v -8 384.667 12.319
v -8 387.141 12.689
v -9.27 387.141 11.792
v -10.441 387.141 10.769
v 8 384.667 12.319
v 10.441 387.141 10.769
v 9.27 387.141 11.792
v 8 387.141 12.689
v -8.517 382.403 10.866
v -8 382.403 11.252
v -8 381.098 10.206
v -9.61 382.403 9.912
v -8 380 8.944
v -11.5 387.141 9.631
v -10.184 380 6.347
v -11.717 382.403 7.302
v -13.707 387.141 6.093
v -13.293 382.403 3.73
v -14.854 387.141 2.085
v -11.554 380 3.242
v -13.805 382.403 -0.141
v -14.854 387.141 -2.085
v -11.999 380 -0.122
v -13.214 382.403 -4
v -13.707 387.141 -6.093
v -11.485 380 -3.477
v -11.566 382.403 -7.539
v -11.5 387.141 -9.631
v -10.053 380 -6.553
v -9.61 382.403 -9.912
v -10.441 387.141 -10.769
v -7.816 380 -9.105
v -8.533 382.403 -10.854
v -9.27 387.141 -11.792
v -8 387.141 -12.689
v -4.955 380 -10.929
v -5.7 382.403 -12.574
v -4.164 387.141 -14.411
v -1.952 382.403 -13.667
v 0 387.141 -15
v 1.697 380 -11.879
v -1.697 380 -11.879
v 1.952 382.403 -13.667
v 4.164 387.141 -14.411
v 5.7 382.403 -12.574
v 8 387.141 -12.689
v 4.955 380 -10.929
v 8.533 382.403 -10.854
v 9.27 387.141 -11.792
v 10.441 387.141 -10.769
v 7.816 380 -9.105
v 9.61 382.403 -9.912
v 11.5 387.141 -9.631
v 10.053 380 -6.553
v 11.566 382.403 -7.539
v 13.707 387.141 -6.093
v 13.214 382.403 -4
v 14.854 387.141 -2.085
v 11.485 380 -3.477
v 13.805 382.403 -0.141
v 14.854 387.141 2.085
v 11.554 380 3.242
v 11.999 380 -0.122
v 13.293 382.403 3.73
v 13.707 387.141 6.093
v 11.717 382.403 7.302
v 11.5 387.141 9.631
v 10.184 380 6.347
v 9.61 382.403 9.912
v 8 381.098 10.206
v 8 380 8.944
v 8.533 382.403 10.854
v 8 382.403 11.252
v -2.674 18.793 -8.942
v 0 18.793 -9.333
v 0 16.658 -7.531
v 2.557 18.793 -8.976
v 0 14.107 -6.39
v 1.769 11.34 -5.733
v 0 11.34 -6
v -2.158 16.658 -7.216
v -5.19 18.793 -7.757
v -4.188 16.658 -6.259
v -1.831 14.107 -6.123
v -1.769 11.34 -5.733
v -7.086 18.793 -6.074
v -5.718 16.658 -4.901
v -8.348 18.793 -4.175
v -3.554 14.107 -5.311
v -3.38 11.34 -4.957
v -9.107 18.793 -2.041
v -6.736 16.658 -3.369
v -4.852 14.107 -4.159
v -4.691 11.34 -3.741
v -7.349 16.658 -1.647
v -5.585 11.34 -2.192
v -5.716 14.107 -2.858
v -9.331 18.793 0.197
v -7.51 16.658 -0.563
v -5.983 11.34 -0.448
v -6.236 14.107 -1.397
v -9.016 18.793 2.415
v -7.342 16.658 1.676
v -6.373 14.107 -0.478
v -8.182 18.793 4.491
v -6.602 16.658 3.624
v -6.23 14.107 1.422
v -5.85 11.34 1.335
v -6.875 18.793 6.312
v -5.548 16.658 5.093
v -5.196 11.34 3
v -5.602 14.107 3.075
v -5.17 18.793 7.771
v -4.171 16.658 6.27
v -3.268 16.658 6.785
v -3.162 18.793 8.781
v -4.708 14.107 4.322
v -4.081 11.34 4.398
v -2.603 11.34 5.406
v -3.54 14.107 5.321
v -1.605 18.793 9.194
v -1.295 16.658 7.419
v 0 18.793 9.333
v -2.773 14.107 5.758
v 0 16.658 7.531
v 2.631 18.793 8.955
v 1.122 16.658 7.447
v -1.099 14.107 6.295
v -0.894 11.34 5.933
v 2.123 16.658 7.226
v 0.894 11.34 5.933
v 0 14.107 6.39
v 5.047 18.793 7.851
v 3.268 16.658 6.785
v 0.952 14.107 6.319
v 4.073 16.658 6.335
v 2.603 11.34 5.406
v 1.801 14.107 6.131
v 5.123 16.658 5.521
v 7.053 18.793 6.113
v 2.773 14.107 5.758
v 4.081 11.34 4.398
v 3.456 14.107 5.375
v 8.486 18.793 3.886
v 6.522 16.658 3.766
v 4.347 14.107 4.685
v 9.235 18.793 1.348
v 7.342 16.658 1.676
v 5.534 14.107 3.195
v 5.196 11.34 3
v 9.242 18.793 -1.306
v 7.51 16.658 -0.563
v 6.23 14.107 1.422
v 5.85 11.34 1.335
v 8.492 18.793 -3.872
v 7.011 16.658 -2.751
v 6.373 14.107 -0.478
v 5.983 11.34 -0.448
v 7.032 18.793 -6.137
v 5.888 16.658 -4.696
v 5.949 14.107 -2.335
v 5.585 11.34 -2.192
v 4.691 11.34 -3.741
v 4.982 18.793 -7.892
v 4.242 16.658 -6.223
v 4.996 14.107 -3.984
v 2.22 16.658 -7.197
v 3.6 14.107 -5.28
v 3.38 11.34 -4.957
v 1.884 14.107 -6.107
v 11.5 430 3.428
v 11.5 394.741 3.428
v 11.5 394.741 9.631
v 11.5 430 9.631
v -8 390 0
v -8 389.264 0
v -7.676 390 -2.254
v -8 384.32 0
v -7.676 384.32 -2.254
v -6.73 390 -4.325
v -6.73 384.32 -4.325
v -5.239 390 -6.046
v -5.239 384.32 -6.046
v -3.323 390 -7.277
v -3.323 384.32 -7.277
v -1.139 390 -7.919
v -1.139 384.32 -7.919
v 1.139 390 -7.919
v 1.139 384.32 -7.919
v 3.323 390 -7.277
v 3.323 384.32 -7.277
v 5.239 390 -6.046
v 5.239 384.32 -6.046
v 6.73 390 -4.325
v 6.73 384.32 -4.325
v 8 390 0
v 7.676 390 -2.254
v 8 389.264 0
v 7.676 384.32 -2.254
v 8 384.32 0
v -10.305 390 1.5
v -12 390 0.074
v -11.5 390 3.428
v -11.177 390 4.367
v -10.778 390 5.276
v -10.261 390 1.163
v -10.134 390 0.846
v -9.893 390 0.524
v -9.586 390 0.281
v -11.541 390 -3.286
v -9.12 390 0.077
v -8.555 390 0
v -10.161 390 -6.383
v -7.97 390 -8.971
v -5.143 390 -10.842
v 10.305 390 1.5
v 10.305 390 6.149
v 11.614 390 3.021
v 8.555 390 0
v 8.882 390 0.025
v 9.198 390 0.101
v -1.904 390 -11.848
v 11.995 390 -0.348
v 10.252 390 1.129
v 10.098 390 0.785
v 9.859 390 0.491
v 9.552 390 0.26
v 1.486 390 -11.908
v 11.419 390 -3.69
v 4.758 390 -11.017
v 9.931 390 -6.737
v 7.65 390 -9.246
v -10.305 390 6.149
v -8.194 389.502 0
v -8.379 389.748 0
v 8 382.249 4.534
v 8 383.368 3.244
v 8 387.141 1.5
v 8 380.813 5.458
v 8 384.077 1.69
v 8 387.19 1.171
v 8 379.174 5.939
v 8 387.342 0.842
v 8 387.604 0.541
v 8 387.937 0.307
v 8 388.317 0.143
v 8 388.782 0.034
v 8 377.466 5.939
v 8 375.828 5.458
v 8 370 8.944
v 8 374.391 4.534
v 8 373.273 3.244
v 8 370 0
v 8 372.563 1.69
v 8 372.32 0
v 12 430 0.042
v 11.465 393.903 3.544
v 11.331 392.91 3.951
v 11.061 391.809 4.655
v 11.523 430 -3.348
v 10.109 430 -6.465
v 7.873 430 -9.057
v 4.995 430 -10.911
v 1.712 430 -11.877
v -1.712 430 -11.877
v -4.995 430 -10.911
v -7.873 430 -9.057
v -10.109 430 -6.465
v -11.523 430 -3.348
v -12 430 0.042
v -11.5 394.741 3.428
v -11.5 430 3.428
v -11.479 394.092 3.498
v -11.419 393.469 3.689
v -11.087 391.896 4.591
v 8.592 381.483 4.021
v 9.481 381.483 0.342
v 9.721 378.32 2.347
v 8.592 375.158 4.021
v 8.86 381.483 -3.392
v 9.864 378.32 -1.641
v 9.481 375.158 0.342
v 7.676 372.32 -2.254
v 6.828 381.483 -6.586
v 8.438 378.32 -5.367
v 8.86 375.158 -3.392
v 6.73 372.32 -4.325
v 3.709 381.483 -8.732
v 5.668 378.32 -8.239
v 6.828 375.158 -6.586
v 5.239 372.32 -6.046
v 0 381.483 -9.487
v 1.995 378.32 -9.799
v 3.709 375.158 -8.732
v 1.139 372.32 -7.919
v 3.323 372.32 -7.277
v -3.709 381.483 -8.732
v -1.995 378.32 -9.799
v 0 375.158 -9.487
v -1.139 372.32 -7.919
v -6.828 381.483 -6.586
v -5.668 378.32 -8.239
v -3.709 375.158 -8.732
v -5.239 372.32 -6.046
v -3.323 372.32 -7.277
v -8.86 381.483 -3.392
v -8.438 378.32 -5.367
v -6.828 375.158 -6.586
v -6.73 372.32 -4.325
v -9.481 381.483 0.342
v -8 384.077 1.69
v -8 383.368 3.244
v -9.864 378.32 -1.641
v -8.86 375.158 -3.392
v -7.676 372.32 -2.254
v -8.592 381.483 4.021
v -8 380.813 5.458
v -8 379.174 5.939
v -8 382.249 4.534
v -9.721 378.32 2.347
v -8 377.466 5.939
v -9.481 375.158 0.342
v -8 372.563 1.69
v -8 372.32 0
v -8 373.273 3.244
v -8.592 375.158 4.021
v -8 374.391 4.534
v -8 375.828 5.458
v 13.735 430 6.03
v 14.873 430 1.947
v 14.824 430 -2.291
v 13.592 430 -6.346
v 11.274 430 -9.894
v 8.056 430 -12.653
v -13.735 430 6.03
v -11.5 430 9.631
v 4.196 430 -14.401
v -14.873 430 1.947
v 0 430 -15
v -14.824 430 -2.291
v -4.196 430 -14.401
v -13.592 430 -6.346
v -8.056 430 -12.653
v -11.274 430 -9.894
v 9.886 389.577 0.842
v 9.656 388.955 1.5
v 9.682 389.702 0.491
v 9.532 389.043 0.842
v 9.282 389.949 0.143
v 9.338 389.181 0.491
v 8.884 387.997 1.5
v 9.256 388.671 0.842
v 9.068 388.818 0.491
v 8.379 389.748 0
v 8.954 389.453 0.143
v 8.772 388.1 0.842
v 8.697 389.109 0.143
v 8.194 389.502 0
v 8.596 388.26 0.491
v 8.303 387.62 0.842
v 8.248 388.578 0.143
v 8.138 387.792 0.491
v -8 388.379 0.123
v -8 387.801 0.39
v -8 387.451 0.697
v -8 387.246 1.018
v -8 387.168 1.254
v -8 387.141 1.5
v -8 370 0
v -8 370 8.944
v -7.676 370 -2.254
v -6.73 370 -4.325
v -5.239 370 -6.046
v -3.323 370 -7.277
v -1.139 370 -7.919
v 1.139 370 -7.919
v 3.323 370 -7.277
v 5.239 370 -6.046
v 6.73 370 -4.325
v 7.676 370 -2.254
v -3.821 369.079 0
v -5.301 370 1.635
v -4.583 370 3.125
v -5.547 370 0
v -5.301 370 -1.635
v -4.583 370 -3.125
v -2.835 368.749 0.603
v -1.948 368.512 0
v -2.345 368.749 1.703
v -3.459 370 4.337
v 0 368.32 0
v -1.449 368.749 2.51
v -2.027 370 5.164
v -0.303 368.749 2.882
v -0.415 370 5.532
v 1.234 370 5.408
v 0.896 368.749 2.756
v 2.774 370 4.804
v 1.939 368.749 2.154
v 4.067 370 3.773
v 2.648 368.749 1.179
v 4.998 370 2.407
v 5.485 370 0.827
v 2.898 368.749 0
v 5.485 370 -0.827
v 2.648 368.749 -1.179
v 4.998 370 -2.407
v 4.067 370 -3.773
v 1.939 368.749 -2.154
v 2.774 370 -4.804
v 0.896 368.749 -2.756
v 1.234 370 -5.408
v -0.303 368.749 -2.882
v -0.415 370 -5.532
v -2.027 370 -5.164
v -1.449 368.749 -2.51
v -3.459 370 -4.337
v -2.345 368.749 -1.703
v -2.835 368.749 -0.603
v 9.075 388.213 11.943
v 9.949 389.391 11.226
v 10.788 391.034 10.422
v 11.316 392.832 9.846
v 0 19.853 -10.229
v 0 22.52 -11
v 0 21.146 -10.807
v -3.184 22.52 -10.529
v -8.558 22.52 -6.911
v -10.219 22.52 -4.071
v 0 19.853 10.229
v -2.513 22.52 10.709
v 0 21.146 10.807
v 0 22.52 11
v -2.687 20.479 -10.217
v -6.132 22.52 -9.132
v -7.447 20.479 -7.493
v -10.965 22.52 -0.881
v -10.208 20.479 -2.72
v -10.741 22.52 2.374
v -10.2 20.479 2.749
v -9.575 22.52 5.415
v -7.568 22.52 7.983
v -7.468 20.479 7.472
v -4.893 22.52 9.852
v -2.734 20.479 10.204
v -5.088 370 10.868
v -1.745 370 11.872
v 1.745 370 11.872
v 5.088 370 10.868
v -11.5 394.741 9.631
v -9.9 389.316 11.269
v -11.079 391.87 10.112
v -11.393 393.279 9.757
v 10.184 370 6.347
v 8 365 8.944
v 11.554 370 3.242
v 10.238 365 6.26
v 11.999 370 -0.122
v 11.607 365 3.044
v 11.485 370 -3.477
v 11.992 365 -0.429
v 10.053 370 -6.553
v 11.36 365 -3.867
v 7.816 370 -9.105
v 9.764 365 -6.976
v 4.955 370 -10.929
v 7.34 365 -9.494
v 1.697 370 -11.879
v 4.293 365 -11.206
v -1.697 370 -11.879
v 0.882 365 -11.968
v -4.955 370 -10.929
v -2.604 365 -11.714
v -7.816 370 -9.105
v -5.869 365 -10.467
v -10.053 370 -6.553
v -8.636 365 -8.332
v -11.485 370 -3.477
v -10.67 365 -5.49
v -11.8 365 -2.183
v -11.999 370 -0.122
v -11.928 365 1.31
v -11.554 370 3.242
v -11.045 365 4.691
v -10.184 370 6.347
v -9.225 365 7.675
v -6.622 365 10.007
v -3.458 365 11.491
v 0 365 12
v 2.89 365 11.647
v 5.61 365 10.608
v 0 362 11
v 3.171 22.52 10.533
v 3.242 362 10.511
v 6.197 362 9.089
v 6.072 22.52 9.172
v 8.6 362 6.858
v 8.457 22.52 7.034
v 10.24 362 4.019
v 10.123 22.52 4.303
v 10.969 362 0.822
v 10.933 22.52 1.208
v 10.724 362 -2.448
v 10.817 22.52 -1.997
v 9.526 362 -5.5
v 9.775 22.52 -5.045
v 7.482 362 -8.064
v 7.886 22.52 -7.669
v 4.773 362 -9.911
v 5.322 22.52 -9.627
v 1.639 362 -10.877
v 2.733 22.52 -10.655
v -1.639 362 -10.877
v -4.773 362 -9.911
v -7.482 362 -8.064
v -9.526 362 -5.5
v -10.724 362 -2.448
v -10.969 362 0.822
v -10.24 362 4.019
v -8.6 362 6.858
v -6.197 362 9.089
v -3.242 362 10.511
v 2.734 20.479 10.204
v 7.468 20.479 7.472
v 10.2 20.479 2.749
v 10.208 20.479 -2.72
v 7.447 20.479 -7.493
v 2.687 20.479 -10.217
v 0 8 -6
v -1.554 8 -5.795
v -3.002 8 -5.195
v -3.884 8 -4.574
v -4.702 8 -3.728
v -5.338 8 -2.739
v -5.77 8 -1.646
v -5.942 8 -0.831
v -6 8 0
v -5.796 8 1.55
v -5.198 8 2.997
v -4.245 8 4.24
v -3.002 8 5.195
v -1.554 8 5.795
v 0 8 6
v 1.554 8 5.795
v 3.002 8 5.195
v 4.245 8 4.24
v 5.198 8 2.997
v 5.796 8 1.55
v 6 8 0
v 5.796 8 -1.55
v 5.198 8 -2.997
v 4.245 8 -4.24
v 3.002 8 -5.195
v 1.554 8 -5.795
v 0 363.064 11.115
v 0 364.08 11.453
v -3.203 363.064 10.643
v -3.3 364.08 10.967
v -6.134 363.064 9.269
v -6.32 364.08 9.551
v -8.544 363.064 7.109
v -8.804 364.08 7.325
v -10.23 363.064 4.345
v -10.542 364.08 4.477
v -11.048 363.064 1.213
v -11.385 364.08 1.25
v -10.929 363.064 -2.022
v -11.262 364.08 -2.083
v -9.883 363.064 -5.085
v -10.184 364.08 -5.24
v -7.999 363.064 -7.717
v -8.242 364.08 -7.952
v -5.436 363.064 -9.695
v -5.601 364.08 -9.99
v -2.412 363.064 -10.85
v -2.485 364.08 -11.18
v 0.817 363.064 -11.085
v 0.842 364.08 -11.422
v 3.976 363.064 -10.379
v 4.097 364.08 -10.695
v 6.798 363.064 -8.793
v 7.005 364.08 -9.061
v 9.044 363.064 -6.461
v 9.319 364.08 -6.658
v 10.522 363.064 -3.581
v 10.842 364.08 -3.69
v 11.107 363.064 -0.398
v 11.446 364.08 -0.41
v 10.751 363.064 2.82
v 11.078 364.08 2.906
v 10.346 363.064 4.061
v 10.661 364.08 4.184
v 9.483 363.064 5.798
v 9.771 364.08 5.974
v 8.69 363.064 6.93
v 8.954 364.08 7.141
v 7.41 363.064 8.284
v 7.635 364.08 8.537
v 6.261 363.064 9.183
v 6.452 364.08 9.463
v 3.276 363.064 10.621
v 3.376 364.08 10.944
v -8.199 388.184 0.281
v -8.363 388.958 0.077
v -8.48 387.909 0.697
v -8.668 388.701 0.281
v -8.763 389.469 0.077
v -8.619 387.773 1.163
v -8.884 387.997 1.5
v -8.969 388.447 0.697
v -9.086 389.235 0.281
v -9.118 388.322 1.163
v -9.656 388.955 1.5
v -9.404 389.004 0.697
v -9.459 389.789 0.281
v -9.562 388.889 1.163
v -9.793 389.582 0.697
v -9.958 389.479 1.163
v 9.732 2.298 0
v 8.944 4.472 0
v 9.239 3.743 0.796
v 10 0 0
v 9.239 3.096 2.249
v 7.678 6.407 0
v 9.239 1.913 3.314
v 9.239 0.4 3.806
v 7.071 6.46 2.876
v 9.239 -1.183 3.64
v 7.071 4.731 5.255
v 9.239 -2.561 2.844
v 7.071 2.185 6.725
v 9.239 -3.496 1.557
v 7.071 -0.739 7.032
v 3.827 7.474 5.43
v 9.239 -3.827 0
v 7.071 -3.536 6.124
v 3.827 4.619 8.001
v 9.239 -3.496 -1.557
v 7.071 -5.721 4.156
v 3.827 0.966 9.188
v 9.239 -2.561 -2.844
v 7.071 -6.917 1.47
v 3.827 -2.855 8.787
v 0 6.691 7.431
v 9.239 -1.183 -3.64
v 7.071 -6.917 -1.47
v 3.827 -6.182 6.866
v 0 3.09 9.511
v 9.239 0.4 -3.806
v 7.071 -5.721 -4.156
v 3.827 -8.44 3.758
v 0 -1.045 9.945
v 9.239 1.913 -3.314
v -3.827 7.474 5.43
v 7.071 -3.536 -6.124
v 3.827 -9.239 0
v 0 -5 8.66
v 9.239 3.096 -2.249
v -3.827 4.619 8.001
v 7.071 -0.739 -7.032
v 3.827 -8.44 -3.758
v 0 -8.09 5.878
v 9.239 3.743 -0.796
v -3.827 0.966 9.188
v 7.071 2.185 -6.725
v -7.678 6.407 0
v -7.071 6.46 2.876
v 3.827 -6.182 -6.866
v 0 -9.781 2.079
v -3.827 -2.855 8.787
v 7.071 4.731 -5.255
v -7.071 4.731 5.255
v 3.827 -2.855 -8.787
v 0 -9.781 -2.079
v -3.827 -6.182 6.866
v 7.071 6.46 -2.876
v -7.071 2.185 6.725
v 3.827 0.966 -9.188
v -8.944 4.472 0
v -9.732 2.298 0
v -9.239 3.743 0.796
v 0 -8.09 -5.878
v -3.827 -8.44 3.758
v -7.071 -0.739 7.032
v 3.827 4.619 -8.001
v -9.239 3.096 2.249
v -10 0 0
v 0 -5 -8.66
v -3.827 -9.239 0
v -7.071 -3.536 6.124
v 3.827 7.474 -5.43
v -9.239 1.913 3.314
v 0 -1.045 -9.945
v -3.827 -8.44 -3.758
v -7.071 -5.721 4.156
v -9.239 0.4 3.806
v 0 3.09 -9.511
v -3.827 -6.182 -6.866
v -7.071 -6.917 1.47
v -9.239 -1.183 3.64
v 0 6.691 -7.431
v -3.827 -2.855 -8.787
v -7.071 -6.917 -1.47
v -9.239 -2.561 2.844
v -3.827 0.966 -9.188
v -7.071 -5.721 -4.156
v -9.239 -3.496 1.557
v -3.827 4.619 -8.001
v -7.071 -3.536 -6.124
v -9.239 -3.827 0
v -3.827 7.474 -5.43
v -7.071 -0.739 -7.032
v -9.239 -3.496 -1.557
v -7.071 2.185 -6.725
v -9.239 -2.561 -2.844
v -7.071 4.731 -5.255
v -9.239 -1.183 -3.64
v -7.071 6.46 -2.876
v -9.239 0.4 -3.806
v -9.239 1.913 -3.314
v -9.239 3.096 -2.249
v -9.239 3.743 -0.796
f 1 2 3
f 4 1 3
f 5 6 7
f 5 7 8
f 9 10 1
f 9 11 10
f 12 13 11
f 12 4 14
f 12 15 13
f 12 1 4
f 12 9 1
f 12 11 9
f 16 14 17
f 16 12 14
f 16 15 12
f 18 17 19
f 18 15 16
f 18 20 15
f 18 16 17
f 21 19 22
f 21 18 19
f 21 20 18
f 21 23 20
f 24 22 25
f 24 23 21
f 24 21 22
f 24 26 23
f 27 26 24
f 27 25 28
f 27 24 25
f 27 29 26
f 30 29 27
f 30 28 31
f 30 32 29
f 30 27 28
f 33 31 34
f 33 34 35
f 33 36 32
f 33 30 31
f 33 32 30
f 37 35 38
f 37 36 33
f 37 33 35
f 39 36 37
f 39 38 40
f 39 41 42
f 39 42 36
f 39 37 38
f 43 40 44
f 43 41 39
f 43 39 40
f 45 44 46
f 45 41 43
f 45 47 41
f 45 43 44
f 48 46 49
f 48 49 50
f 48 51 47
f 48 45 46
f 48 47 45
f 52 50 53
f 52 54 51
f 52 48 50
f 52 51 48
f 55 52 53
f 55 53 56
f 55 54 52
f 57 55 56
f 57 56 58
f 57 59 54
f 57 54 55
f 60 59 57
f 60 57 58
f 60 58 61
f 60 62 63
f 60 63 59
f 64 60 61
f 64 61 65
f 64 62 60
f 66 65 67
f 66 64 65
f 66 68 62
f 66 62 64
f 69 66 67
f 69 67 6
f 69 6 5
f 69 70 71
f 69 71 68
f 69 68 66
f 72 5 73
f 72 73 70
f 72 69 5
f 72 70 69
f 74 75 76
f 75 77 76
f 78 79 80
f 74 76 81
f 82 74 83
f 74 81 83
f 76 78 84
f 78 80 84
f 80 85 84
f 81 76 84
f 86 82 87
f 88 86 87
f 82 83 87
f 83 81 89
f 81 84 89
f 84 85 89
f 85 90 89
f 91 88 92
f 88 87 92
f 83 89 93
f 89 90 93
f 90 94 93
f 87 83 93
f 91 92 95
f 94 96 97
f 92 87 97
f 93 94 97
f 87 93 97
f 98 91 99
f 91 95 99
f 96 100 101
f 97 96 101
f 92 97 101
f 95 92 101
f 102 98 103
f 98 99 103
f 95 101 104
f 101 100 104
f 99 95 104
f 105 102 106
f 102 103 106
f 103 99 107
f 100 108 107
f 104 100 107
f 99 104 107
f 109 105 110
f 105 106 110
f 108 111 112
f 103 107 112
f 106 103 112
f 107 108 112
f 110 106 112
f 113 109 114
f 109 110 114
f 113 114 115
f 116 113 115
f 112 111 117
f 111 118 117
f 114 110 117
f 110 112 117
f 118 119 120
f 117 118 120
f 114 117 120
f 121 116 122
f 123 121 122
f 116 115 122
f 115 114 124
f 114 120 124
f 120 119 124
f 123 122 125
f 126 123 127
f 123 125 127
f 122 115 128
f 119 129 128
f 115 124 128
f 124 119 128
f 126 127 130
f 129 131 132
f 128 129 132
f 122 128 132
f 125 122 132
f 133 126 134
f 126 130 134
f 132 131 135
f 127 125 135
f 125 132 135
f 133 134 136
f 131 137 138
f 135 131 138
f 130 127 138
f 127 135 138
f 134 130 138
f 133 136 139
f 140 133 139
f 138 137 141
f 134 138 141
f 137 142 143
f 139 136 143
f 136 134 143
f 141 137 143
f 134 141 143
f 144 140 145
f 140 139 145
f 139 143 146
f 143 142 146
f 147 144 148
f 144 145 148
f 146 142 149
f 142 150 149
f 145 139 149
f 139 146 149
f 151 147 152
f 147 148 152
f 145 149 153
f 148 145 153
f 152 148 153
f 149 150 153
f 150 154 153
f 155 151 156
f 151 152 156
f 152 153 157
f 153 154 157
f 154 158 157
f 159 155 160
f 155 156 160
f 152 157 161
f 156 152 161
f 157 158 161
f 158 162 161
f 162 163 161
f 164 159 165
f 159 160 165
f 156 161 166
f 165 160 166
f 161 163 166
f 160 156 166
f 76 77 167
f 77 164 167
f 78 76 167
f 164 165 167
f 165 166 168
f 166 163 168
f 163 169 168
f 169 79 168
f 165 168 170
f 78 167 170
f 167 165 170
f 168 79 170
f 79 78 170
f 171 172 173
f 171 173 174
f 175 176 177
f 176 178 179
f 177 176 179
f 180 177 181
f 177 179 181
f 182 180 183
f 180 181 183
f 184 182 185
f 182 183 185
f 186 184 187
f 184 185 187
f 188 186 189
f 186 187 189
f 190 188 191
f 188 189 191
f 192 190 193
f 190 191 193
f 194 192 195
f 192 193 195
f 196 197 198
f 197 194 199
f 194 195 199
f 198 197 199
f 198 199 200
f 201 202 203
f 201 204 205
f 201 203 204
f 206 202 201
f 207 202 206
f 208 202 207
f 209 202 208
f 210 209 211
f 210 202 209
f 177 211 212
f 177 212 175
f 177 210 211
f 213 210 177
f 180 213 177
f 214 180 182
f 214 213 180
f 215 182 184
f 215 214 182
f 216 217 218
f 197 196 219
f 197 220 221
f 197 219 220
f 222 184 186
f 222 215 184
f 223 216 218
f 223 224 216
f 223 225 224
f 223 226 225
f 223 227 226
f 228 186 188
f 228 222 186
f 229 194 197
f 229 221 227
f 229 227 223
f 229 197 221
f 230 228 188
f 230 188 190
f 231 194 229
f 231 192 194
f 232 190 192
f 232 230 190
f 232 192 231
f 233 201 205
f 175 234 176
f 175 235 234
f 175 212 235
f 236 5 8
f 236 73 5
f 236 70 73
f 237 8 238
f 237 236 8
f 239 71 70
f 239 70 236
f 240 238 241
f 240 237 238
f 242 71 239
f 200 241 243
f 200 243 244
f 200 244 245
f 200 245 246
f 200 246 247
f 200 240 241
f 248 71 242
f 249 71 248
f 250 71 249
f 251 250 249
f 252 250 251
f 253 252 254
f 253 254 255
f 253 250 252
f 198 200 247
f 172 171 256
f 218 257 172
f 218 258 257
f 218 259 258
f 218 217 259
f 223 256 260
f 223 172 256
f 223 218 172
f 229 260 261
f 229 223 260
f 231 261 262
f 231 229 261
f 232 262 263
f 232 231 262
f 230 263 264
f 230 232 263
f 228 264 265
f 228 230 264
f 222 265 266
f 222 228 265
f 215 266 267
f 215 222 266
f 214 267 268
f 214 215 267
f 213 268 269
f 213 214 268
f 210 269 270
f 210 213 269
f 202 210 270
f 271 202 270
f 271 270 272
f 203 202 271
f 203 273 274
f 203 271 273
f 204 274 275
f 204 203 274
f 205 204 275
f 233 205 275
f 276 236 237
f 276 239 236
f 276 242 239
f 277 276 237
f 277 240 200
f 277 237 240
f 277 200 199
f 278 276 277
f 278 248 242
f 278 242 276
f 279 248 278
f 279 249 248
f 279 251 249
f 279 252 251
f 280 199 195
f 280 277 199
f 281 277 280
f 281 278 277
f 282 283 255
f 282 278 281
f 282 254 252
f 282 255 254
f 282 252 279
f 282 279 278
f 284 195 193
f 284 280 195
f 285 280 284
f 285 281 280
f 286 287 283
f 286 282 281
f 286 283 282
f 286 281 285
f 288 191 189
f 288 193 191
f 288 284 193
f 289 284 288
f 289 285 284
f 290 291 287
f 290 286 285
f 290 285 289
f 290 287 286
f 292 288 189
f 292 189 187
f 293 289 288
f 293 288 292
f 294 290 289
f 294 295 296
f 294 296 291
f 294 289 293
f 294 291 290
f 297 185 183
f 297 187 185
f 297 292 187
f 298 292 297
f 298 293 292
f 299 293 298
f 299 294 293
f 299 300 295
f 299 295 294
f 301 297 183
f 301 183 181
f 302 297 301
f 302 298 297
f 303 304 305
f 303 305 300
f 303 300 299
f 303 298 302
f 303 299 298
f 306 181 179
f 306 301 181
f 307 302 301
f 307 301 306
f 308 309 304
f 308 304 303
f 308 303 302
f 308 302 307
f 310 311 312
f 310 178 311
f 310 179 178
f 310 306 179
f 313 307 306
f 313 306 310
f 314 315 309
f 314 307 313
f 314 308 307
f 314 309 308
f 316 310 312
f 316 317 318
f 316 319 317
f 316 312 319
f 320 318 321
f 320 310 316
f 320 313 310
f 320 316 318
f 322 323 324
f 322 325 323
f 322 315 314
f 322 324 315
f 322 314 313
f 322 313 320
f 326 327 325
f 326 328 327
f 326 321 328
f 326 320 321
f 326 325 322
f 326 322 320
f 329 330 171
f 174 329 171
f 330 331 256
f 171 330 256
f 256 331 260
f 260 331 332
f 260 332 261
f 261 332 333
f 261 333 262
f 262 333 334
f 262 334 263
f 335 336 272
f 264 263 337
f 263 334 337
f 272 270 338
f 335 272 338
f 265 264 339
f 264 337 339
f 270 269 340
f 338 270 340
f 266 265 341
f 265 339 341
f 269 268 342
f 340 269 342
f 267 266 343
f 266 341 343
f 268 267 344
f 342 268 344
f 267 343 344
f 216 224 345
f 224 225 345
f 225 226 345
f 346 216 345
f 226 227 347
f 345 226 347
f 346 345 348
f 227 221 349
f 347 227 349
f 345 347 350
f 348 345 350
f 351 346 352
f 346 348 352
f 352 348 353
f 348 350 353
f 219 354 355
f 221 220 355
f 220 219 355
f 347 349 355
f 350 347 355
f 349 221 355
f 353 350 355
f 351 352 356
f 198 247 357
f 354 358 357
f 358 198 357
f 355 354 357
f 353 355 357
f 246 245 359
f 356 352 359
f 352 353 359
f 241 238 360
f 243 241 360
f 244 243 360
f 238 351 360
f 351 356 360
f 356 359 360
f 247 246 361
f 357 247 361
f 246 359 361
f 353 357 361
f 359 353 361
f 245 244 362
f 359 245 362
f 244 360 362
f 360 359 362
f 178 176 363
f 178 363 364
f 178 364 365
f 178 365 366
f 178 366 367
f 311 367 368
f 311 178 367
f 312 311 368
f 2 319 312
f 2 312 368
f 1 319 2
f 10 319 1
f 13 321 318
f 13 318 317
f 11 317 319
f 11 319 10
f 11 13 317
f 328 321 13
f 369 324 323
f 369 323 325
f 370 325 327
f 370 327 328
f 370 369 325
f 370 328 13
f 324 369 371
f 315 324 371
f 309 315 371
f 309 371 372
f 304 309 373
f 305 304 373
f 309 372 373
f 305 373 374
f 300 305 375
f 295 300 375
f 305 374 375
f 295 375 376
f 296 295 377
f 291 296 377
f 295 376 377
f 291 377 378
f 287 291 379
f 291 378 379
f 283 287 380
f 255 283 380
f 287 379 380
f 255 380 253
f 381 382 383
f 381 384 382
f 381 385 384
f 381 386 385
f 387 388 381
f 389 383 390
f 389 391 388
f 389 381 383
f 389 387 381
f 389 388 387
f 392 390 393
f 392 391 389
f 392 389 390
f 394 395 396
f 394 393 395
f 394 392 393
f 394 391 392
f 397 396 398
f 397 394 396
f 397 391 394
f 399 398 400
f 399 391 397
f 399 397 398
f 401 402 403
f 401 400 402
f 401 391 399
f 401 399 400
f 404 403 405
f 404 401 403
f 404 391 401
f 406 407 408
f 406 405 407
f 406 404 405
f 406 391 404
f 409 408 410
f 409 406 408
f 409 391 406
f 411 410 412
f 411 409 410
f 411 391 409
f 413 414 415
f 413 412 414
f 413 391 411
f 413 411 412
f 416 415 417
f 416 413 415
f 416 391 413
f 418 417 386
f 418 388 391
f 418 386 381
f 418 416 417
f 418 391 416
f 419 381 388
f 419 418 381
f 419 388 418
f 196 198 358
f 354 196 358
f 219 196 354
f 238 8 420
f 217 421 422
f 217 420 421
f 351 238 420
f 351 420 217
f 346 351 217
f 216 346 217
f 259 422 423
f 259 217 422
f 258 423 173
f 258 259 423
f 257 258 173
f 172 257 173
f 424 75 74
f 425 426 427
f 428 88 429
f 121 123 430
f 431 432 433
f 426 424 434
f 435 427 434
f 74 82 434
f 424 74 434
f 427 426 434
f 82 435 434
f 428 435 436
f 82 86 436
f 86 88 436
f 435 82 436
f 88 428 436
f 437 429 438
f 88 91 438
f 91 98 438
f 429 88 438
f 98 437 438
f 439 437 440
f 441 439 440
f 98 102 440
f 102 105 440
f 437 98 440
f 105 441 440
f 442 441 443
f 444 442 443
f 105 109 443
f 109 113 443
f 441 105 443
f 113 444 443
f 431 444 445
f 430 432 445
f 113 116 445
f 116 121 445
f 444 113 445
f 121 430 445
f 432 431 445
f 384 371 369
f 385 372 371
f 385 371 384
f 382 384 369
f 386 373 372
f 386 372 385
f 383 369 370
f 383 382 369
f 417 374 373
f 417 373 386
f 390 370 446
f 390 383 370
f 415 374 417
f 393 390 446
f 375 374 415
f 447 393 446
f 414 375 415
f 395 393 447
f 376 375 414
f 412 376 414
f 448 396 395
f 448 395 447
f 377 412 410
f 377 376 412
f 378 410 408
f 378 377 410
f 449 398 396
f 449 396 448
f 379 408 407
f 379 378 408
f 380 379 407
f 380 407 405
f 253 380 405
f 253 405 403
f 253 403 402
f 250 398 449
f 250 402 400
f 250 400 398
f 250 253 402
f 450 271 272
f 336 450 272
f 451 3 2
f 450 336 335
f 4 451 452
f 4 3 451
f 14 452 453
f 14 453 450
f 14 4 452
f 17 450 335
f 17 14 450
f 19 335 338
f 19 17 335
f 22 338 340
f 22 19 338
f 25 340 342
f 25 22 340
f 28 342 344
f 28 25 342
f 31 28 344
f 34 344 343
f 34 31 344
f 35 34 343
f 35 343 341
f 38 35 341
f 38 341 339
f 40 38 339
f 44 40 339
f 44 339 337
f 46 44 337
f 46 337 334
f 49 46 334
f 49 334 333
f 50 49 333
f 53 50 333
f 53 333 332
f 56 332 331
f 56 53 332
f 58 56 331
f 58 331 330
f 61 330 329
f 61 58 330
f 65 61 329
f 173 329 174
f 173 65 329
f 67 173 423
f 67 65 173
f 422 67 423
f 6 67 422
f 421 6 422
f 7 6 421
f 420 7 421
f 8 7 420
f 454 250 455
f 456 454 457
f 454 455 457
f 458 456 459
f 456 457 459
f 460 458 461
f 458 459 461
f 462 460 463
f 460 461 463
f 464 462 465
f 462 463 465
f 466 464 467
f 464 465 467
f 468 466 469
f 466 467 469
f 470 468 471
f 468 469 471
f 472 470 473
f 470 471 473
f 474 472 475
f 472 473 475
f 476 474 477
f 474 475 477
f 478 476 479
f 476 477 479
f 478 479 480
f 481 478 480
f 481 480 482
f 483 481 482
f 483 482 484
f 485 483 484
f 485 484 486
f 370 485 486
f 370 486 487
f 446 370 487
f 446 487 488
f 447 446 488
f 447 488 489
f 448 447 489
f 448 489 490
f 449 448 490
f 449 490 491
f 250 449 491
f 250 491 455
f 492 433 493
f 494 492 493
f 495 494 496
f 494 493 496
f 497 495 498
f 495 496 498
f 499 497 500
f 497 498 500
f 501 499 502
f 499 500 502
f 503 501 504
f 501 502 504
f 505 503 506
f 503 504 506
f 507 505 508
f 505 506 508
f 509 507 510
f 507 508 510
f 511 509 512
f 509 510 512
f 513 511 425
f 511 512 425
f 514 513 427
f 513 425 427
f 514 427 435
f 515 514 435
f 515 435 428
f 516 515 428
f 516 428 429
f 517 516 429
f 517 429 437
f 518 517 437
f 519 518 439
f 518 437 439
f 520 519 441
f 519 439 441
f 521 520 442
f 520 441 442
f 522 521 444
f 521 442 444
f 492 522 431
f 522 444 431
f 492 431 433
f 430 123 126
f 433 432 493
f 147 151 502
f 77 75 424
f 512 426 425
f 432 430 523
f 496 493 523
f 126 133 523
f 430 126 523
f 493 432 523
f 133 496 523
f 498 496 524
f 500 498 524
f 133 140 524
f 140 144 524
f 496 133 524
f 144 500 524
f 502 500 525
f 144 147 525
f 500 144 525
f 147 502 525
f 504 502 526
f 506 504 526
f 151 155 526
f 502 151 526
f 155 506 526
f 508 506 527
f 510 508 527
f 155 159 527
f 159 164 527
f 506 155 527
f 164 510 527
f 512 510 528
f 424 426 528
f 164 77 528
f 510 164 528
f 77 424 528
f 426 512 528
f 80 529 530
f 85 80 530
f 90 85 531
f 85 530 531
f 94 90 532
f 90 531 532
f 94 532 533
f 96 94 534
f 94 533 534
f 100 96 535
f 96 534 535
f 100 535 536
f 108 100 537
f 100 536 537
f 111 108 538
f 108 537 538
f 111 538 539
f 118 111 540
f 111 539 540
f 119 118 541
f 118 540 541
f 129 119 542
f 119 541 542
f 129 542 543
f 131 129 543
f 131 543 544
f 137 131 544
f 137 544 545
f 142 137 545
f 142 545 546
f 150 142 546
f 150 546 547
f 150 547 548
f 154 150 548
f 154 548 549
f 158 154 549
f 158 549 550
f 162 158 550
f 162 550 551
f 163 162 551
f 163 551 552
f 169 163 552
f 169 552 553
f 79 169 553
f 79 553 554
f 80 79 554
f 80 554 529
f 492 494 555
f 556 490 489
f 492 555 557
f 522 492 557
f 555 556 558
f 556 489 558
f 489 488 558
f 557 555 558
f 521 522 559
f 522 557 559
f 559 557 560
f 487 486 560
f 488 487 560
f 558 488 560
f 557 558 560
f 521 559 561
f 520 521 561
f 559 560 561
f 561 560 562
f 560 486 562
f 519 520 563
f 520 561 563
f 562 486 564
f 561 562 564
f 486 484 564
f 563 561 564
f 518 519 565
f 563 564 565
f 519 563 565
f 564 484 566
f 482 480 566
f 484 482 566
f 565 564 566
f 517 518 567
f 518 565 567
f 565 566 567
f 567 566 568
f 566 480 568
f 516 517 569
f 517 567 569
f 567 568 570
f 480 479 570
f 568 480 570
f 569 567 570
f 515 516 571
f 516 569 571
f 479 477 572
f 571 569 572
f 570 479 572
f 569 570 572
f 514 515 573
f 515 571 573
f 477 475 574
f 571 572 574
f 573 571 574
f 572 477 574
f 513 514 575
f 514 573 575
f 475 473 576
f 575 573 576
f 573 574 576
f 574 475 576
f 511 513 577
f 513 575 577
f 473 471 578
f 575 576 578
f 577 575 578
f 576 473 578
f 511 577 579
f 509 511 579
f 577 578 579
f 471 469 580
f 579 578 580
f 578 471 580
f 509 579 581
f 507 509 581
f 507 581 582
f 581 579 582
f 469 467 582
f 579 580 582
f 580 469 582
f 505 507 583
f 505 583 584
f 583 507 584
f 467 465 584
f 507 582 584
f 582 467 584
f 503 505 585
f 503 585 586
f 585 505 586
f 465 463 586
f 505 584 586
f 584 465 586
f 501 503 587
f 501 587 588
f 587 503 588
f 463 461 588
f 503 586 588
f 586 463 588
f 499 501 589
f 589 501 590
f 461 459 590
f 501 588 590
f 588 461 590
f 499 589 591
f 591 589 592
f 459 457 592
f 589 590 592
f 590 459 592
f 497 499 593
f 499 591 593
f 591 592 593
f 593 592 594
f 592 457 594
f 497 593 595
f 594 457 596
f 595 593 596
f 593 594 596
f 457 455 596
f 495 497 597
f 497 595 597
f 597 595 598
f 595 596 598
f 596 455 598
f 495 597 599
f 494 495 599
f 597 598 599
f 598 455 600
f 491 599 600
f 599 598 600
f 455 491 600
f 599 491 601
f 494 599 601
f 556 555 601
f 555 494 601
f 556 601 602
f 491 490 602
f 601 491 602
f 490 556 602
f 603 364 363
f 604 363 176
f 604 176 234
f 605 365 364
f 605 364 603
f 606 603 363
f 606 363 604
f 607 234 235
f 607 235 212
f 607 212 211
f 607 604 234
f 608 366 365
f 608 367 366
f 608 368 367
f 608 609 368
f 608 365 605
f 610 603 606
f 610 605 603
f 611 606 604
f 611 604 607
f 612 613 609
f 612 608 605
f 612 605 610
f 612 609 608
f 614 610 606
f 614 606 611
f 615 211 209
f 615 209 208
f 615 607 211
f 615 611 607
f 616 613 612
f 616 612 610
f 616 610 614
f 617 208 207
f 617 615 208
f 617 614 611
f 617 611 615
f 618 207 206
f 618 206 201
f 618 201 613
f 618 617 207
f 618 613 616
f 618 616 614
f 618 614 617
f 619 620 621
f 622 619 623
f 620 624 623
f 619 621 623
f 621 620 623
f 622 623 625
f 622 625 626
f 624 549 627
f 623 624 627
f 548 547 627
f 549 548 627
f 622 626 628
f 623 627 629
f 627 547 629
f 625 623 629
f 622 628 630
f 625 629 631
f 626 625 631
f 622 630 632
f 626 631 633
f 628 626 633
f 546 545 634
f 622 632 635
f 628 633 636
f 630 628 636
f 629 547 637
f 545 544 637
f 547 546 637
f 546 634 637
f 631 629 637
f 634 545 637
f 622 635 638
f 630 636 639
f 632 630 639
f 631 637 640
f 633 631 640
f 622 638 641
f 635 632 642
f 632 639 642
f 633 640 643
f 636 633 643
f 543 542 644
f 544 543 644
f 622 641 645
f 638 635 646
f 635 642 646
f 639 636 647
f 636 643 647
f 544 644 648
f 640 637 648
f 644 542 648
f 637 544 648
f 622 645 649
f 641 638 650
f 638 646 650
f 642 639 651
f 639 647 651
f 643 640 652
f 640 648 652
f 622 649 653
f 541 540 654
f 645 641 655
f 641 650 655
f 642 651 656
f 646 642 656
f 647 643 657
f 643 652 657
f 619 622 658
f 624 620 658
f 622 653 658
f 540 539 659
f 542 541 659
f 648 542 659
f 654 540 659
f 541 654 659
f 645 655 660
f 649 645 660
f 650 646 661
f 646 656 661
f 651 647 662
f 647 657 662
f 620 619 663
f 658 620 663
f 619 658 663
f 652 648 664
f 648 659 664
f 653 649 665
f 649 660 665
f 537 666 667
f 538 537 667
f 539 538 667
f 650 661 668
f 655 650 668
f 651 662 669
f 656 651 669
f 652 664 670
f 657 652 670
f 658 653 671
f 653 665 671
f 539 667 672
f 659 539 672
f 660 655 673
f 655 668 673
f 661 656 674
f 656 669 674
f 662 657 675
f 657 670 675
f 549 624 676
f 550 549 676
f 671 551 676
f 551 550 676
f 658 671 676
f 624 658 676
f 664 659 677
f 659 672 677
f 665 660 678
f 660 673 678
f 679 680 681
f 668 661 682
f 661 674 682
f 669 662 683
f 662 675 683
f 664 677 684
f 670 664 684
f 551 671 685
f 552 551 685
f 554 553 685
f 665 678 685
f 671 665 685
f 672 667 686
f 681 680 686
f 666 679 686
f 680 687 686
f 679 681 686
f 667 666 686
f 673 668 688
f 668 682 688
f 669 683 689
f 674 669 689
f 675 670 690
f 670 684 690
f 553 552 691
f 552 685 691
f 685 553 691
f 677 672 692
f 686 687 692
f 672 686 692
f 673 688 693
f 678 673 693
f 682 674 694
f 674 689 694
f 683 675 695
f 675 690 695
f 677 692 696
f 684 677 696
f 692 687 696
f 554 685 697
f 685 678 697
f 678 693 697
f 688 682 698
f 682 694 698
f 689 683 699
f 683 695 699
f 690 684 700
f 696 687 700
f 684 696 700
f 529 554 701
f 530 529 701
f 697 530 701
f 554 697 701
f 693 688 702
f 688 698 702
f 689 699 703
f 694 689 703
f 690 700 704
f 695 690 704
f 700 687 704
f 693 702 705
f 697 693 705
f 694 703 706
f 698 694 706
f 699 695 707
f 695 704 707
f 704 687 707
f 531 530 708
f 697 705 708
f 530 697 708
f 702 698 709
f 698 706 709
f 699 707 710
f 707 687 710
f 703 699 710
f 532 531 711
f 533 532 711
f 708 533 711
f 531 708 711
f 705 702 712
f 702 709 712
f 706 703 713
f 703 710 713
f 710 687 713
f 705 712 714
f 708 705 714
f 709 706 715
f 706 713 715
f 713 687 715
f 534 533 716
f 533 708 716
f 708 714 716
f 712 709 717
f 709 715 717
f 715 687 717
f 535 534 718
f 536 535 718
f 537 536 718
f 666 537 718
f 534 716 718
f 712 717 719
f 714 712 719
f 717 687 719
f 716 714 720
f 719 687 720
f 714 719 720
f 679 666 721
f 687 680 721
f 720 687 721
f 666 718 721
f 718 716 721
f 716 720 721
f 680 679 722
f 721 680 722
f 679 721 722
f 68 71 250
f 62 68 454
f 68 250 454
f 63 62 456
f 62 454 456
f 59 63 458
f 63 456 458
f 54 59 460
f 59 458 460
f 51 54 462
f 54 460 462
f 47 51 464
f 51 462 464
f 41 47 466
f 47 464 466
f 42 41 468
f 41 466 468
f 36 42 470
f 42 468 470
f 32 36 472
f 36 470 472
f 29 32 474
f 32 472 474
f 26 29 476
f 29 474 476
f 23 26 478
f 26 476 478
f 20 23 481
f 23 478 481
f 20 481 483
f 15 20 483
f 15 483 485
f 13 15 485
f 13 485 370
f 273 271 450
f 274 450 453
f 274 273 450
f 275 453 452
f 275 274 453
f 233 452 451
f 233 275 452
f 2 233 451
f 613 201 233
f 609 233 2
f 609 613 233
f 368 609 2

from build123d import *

# Parameters (mm, degrees)
ESBO_O2_R                     = 6
RESSALTO_EXTRUS_O1_DEPTH      = 20
ESBO_O3_R                     = 11
RESSALTO_EXTRUS_O2_DEPTH      = 350
FILETE1_R                     = 10
FILETE2_R                     = 5
RESSALTO_EXTRUS_O3_DEPTH      = 20
RESSALTO_EXTRUS_O4_START      = -5
ESBO_O7_R                     = 12
RESSALTO_EXTRUS_O4_DEPTH      = 5
FILETE3_R                     = 5
RESSALTO_EXTRUS_O5_DEPTH      = 40
RESSALTO_EXTRUS_O5_DEPTH_BACK = 10
FILETE4_R                     = 10
ESBO_O11_W                    = 23
ESBO_O11_H                    = 42.858571571
CORTE_EXTRUS_O3_DEPTH         = 40
FILETE5_R                     = 10
FILETE6_R                     = 1.5


with BuildPart() as part:
    # Esboço1 → Revolução1 (revolve)
    with BuildSketch(Plane.XY):
        with BuildLine():
            Line((-10, 0), (10, 0))
            ThreePointArc((10, 0), (0, 10), (-10, 0))
        make_face()
    revolve(axis=Axis((-10, 0, 0), (1, 0, 0)))

    # Esboço2 → Ressalto-extrusão1 (add)
    with BuildSketch(Plane(origin=(0, 0, 0), x_dir=(1, 0, 0), z_dir=(0, 1, 0))):
        with Locations(Location((0, 0, 0), (0, 0, 90))):
            Circle(ESBO_O2_R)
    extrude(amount=RESSALTO_EXTRUS_O1_DEPTH)

    # Esboço3 → Ressalto-extrusão2 (add)
    with BuildSketch(Plane(origin=(0, 20, 0), x_dir=(1, 0, 0), z_dir=(0, 1, 0))):
        with Locations(Location((0, 0, 0), (0, 0, 270))):
            Circle(ESBO_O3_R)
    extrude(amount=RESSALTO_EXTRUS_O2_DEPTH)

    # Filete1
    # the kernel refuses this fillet: 10 mm, written as the material it adds along each edge
    with BuildSketch(Plane(origin=(0, 20, 0), x_dir=(0, 0, -1), z_dir=(1, 0, 0))) as filete1_piece_1:
        with BuildLine():
            CenterArc((16, -8.660254038), FILETE1_R, 120, 60)
            Line((6, -8.660254038), (5.8, -8.660254038))
            Line((5.8, -8.660254038), (5.8, 0))
            Line((5.8, 0), (6, 0.2))
            ThreePointArc((6, 0.2), (8.5, 0.2), (10.9, 0.173205081))
            Line((10.9, 0.173205081), (11, 0))
        make_face()
    revolve(axis=Axis((0, 20, 0), (0, 1, 0)))

    # Filete2
    filete2_edges = [part.edges().sort_by_distance(p)[0] for p in [
        (11, 20, 0),
    ]]
    fillet(filete2_edges, radius=FILETE2_R)

    # Esboço5 → Ressalto-extrusão3 (add)
    with BuildSketch(Plane(origin=(0, 370, 0), x_dir=(1, 0, 0), z_dir=(0, 1, 0))):
        with BuildLine():
            Line((-8, -8.94427191), (-8, 0))
            ThreePointArc((-8, 0), (0, 8), (8, 0))
            Line((8, 0), (8, -8.94427191))
            ThreePointArc((8, -8.94427191), (12, 0), (8, 8.94427191))
            ThreePointArc((8, 8.94427191), (0, 12), (-8, 8.94427191))
            ThreePointArc((-8, 8.94427191), (-12, 0), (-8, -8.94427191))
        make_face()
    extrude(amount=RESSALTO_EXTRUS_O3_DEPTH)

    # Esboço7 → Ressalto-extrusão4 (add)
    with BuildSketch(Plane(origin=(0, 370, 0), x_dir=(1, 0, 0), z_dir=(0, 1, 0)).offset(RESSALTO_EXTRUS_O4_START)):
        with Locations(Location((0, 0, 0), (0, 0, 311.810314896))):
            Circle(ESBO_O7_R)
    extrude(amount=RESSALTO_EXTRUS_O4_DEPTH)

    # Filete3
    # the kernel refuses this fillet: 5 mm, written as the material it adds along each edge
    with BuildSketch(Plane(origin=(0, 365, 0), x_dir=(0, 0, 1), z_dir=(1, 0, 0))) as filete3_piece_1:
        with BuildLine():
            CenterArc((16, 3), FILETE3_R, 180, 36.869897646)
            Line((12, 0), (11.92, -0.06))
            ThreePointArc((11.92, -0.06), (11.5, -0.1), (11, -0.1))
            Line((11, -0.1), (10.9, 0))
            Line((10.9, 0), (10.9, 3))
            Line((10.9, 3), (11, 3))
        make_face()
    revolve(axis=Axis((0, 365, 0), (0, -1, 0)))

    # Esboço8 → Corte-Revolução1 (revolve, cut)
    with BuildSketch(Plane.XY):
        with BuildLine():
            Line((0, 368.32023385), (0, 388.32023385))
            ThreePointArc((0, 388.32023385), (-10, 378.32023385), (0, 368.32023385))
        make_face()
    revolve(axis=Axis((0, 368.32023385, 0), (0, 1, 0)), mode=Mode.SUBTRACT)

    # Esboço10 → Ressalto-extrusão5 (add, two sides: drawn at the far end of the back side and taken through both)
    with BuildSketch(Plane(origin=(0, 390, 0), x_dir=(1, 0, 0), z_dir=(0, 1, 0)).offset(-RESSALTO_EXTRUS_O5_DEPTH_BACK)):
        with BuildLine():
            Line((-8, -8.94427191), (-8, -12.68857754))
            ThreePointArc((-8, -12.68857754), (0, 15), (8, -12.68857754))
            Line((8, -12.68857754), (8, -8.94427191))
            ThreePointArc((8, -8.94427191), (0, 12), (-8, -8.94427191))
        make_face()
    extrude(amount=RESSALTO_EXTRUS_O5_DEPTH + RESSALTO_EXTRUS_O5_DEPTH_BACK)

    # Filete4
    # the kernel refuses this fillet: 10 mm, written as the material it takes off along each edge
    with BuildSketch(Plane(origin=(0, 380, 0), x_dir=(-0.003141587485879309, 0, 0.9999950652018582), z_dir=(0.9999950652018582, 0, 0.003141587485879309))) as filete4_piece_1:
        with BuildLine():
            CenterArc((5, -7.141428429), FILETE4_R, 0, 45.572995999)
            Line((15, -7.141428429), (15, 0))
            Line((15, 0), (12, 0))
        make_face()
    revolve(axis=Axis((0, 380, 0), (0, -1, 0)), revolution_arc=359.64, mode=Mode.SUBTRACT)

    # Esboço11 → Corte-extrusão3 (cut)
    with BuildSketch(Plane.XY):
        with Locations((0, 408.570714215)):
            Rectangle(ESBO_O11_W, ESBO_O11_H)
    extrude(amount=CORTE_EXTRUS_O3_DEPTH, mode=Mode.SUBTRACT)

    # Filete5
    # the kernel refuses this fillet: 10 mm, written as the material it adds along each edge
    with BuildSketch(Plane(origin=(11.5, 387.141428429, -18.998355192), x_dir=(-1, 0, 0), z_dir=(0, 0, 1))) as filete5_piece_1_section:
        with BuildLine():
            CenterArc((10, -7.599342077), FILETE5_R, 130.541601874, 49.458398126)
            Line((0, -7.599342077), (0, 0))
            Line((0, 0), (3.5, 0))
        make_face()
    filete5_piece_1 = extrude(amount=47.627390526, mode=Mode.PRIVATE)
    filete5_piece_1 = filete5_piece_1 & Plane(origin=(0, 388.451461542, 0), x_dir=(-0.5333333333333332, 0, 0.8459051693633014), z_dir=(0, -1, 0)) * Cylinder(15, 126, mode=Mode.PRIVATE)
    filete5_piece_1 = split(filete5_piece_1, bisect_by=Plane(origin=(9.300320043, 390, 4.472135955), z_dir=(0, -1, 0)), keep=Keep.TOP, mode=Mode.PRIVATE)
    add(filete5_piece_1)
    with BuildSketch(Plane(origin=(11.5, 387.141428429, -18.998355192), x_dir=(-1, 0, 0), z_dir=(0, 0, 1))) as filete5_piece_2_section:
        with BuildLine():
            CenterArc((10, -7.599342077), FILETE5_R, 130.541601874, 49.458398126)
            Line((0, -7.599342077), (0, 0))
            Line((0, 0), (3.5, 0))
        make_face()
    filete5_piece_2 = extrude(amount=47.627390526, mode=Mode.PRIVATE)
    filete5_piece_2 = filete5_piece_2 & Plane(origin=(0, 392.291329927, 0), x_dir=(-0.5333333333333332, 0, 0.8459051693633014), z_dir=(0, -1, 0)) * Cylinder(15, 126, mode=Mode.PRIVATE)
    filete5_piece_2 = filete5_piece_2 - Plane(origin=(0, 392.291329927, 0), x_dir=(0.666666666666667, 0, 0.7453559924999297), z_dir=(0, -1, 0)) * Cylinder(12, 126, mode=Mode.PRIVATE)
    add(filete5_piece_2)
    with BuildSketch(Plane(origin=(-11.5, 387.141428429, -18.998355192), x_dir=(1, 0, 0), z_dir=(0, 0, 1))) as filete5_piece_3_section:
        with BuildLine():
            CenterArc((10, 7.599342077), FILETE5_R, 180, 49.458398126)
            Line((0, 7.599342077), (0, 0))
            Line((0, 0), (3.5, 0))
        make_face()
    filete5_piece_3 = extrude(amount=47.627390526, mode=Mode.PRIVATE)
    filete5_piece_3 = filete5_piece_3 & Plane(origin=(0, 388.451461532, 0), x_dir=(-0.5333333333333332, 0, 0.8459051693633014), z_dir=(0, -1, 0)) * Cylinder(15, 126, mode=Mode.PRIVATE)
    filete5_piece_3 = split(filete5_piece_3, bisect_by=Plane(origin=(-9.300320034, 390, 4.472135955), z_dir=(0, -1, 0)), keep=Keep.TOP, mode=Mode.PRIVATE)
    add(filete5_piece_3)
    with BuildSketch(Plane(origin=(-11.5, 387.141428429, -18.998355192), x_dir=(1, 0, 0), z_dir=(0, 0, 1))) as filete5_piece_4_section:
        with BuildLine():
            CenterArc((10, 7.599342077), FILETE5_R, 180, 49.458398126)
            Line((0, 7.599342077), (0, 0))
            Line((0, 0), (3.5, 0))
        make_face()
    filete5_piece_4 = extrude(amount=47.627390526, mode=Mode.PRIVATE)
    filete5_piece_4 = filete5_piece_4 & Plane(origin=(0, 392.291329925, 0), x_dir=(-0.5333333333333332, 0, 0.8459051693633014), z_dir=(0, -1, 0)) * Cylinder(15, 126, mode=Mode.PRIVATE)
    filete5_piece_4 = filete5_piece_4 - Plane(origin=(0, 392.291329925, 0), x_dir=(0.666666666666667, 0, 0.7453559924999297), z_dir=(0, -1, 0)) * Cylinder(12, 126, mode=Mode.PRIVATE)
    add(filete5_piece_4)

    # Filete6
    filete6_edges = [part.edges().sort_by_distance(p)[0] for p in [
        (9.284750533, 388.464015043, 0),
        (-9.284750533, 388.464015043, 0),
    ]]
    fillet(filete6_edges, radius=FILETE6_R)


solid = part.part
